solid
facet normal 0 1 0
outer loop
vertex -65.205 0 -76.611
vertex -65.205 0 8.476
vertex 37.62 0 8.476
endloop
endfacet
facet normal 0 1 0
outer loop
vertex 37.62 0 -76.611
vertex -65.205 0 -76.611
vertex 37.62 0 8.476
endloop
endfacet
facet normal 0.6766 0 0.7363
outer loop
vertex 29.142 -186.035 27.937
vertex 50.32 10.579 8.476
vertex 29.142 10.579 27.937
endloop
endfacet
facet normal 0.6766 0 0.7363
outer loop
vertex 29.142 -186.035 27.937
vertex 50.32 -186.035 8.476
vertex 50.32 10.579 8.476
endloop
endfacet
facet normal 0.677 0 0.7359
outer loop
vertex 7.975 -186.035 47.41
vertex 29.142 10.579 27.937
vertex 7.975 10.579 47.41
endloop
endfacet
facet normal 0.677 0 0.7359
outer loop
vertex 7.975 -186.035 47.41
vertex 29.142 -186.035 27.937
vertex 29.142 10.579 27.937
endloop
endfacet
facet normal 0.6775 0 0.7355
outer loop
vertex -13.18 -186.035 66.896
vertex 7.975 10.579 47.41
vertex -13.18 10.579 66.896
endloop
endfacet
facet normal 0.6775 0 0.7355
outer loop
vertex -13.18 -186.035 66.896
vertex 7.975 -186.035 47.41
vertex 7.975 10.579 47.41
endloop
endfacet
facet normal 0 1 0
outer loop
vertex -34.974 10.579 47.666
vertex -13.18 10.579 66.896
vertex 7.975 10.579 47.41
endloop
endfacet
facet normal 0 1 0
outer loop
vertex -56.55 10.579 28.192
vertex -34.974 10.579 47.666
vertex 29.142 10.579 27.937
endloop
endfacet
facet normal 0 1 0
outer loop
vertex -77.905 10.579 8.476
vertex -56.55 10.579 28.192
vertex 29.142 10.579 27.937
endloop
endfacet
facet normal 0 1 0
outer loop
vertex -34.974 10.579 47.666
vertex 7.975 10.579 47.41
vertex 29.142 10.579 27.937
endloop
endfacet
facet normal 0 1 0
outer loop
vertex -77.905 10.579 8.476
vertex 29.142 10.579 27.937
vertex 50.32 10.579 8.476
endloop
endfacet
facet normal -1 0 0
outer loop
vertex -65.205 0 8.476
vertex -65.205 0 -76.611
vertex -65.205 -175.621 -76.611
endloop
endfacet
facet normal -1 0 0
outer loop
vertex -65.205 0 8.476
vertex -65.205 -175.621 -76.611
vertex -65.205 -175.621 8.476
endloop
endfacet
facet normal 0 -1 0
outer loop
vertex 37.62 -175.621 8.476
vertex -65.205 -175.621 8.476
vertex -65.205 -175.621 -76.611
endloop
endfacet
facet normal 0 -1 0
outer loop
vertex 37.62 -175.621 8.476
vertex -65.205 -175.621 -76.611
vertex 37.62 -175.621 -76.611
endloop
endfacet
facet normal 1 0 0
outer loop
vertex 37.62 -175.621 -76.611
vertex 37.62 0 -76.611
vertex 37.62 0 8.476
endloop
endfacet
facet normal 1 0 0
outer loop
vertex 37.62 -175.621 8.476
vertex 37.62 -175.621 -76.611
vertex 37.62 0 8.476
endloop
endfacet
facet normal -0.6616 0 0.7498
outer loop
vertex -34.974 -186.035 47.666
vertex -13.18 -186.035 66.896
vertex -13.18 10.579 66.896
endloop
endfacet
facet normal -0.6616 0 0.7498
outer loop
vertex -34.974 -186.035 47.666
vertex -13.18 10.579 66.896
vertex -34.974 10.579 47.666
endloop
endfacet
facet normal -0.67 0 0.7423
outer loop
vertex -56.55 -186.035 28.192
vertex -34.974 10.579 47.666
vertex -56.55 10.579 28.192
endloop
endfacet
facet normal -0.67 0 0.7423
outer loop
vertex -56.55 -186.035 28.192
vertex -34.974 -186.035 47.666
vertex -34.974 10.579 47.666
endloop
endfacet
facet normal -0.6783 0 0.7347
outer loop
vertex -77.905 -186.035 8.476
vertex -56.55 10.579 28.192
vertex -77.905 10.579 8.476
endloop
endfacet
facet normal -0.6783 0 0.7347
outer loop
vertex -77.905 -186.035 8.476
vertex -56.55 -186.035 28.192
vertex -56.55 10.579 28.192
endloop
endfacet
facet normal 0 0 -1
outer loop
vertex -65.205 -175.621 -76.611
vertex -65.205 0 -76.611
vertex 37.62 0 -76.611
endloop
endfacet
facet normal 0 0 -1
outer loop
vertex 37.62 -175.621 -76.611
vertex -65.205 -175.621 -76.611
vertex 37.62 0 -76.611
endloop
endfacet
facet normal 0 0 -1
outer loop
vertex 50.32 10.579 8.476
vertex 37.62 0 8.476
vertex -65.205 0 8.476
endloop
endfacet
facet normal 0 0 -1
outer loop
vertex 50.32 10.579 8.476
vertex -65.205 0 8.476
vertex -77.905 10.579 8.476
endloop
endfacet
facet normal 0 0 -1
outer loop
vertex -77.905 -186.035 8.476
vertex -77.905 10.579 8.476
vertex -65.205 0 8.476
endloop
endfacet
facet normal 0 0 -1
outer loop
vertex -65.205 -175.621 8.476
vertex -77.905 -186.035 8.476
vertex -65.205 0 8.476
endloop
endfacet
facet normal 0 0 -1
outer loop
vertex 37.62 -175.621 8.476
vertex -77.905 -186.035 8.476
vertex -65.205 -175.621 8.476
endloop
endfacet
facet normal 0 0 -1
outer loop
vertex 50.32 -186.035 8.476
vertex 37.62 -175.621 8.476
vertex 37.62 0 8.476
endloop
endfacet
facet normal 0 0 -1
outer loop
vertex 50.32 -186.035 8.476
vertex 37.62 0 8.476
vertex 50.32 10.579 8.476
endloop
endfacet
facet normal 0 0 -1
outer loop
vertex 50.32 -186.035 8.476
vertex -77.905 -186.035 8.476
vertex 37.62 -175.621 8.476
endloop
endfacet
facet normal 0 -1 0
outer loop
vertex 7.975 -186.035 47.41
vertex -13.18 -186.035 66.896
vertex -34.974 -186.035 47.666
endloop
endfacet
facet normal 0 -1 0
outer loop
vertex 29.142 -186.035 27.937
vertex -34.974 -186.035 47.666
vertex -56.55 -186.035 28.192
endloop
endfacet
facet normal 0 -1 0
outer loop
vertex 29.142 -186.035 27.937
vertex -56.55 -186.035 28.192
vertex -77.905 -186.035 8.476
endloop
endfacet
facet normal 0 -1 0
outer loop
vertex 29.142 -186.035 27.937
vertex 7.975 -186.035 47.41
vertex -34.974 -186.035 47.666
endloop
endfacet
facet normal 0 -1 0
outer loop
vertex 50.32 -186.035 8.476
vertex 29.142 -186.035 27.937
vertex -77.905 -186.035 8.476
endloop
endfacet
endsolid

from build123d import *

# Parameters (mm, degrees)
F0_W          = 102.824826
F0_H          = 85.087308
F2_DEPTH      = 175.62094
F3_DEPTH      = 186.03524
F3_DEPTH_BACK = 10.57893
F4_DEPTH      = 63.5


with BuildPart() as f2:
    # F0 (on Front) → F2 (new body)
    with BuildSketch(Plane.XZ):
        with Locations((-13.792595, -34.067582)):
            Rectangle(F0_W, F0_H)
    extrude(amount=F2_DEPTH)

    # F1 (on Front) → F3 (join, two sides)
    with BuildSketch(Plane.XZ) as f3_sk:
        with BuildLine():
            ThreePointArc((50.319818, 8.476072), (18.556965, 37.672102), (-13.180182, 66.896072))
            ThreePointArc((-13.180182, 66.896072), (-45.789547, 37.959676), (-77.905008, 8.476072))
            Line((-77.905008, 8.476072), (50.319818, 8.476072))
        make_face()
    extrude(amount=F3_DEPTH)
    extrude(f3_sk.sketch, amount=-F3_DEPTH_BACK)

    # F0 (on Front) → F4 (join)
    with BuildSketch(Plane.XZ):
        with Locations((-13.792595, -34.067582)):
            Rectangle(F0_W, F0_H)
    extrude(amount=F4_DEPTH)


solid = f2.part
